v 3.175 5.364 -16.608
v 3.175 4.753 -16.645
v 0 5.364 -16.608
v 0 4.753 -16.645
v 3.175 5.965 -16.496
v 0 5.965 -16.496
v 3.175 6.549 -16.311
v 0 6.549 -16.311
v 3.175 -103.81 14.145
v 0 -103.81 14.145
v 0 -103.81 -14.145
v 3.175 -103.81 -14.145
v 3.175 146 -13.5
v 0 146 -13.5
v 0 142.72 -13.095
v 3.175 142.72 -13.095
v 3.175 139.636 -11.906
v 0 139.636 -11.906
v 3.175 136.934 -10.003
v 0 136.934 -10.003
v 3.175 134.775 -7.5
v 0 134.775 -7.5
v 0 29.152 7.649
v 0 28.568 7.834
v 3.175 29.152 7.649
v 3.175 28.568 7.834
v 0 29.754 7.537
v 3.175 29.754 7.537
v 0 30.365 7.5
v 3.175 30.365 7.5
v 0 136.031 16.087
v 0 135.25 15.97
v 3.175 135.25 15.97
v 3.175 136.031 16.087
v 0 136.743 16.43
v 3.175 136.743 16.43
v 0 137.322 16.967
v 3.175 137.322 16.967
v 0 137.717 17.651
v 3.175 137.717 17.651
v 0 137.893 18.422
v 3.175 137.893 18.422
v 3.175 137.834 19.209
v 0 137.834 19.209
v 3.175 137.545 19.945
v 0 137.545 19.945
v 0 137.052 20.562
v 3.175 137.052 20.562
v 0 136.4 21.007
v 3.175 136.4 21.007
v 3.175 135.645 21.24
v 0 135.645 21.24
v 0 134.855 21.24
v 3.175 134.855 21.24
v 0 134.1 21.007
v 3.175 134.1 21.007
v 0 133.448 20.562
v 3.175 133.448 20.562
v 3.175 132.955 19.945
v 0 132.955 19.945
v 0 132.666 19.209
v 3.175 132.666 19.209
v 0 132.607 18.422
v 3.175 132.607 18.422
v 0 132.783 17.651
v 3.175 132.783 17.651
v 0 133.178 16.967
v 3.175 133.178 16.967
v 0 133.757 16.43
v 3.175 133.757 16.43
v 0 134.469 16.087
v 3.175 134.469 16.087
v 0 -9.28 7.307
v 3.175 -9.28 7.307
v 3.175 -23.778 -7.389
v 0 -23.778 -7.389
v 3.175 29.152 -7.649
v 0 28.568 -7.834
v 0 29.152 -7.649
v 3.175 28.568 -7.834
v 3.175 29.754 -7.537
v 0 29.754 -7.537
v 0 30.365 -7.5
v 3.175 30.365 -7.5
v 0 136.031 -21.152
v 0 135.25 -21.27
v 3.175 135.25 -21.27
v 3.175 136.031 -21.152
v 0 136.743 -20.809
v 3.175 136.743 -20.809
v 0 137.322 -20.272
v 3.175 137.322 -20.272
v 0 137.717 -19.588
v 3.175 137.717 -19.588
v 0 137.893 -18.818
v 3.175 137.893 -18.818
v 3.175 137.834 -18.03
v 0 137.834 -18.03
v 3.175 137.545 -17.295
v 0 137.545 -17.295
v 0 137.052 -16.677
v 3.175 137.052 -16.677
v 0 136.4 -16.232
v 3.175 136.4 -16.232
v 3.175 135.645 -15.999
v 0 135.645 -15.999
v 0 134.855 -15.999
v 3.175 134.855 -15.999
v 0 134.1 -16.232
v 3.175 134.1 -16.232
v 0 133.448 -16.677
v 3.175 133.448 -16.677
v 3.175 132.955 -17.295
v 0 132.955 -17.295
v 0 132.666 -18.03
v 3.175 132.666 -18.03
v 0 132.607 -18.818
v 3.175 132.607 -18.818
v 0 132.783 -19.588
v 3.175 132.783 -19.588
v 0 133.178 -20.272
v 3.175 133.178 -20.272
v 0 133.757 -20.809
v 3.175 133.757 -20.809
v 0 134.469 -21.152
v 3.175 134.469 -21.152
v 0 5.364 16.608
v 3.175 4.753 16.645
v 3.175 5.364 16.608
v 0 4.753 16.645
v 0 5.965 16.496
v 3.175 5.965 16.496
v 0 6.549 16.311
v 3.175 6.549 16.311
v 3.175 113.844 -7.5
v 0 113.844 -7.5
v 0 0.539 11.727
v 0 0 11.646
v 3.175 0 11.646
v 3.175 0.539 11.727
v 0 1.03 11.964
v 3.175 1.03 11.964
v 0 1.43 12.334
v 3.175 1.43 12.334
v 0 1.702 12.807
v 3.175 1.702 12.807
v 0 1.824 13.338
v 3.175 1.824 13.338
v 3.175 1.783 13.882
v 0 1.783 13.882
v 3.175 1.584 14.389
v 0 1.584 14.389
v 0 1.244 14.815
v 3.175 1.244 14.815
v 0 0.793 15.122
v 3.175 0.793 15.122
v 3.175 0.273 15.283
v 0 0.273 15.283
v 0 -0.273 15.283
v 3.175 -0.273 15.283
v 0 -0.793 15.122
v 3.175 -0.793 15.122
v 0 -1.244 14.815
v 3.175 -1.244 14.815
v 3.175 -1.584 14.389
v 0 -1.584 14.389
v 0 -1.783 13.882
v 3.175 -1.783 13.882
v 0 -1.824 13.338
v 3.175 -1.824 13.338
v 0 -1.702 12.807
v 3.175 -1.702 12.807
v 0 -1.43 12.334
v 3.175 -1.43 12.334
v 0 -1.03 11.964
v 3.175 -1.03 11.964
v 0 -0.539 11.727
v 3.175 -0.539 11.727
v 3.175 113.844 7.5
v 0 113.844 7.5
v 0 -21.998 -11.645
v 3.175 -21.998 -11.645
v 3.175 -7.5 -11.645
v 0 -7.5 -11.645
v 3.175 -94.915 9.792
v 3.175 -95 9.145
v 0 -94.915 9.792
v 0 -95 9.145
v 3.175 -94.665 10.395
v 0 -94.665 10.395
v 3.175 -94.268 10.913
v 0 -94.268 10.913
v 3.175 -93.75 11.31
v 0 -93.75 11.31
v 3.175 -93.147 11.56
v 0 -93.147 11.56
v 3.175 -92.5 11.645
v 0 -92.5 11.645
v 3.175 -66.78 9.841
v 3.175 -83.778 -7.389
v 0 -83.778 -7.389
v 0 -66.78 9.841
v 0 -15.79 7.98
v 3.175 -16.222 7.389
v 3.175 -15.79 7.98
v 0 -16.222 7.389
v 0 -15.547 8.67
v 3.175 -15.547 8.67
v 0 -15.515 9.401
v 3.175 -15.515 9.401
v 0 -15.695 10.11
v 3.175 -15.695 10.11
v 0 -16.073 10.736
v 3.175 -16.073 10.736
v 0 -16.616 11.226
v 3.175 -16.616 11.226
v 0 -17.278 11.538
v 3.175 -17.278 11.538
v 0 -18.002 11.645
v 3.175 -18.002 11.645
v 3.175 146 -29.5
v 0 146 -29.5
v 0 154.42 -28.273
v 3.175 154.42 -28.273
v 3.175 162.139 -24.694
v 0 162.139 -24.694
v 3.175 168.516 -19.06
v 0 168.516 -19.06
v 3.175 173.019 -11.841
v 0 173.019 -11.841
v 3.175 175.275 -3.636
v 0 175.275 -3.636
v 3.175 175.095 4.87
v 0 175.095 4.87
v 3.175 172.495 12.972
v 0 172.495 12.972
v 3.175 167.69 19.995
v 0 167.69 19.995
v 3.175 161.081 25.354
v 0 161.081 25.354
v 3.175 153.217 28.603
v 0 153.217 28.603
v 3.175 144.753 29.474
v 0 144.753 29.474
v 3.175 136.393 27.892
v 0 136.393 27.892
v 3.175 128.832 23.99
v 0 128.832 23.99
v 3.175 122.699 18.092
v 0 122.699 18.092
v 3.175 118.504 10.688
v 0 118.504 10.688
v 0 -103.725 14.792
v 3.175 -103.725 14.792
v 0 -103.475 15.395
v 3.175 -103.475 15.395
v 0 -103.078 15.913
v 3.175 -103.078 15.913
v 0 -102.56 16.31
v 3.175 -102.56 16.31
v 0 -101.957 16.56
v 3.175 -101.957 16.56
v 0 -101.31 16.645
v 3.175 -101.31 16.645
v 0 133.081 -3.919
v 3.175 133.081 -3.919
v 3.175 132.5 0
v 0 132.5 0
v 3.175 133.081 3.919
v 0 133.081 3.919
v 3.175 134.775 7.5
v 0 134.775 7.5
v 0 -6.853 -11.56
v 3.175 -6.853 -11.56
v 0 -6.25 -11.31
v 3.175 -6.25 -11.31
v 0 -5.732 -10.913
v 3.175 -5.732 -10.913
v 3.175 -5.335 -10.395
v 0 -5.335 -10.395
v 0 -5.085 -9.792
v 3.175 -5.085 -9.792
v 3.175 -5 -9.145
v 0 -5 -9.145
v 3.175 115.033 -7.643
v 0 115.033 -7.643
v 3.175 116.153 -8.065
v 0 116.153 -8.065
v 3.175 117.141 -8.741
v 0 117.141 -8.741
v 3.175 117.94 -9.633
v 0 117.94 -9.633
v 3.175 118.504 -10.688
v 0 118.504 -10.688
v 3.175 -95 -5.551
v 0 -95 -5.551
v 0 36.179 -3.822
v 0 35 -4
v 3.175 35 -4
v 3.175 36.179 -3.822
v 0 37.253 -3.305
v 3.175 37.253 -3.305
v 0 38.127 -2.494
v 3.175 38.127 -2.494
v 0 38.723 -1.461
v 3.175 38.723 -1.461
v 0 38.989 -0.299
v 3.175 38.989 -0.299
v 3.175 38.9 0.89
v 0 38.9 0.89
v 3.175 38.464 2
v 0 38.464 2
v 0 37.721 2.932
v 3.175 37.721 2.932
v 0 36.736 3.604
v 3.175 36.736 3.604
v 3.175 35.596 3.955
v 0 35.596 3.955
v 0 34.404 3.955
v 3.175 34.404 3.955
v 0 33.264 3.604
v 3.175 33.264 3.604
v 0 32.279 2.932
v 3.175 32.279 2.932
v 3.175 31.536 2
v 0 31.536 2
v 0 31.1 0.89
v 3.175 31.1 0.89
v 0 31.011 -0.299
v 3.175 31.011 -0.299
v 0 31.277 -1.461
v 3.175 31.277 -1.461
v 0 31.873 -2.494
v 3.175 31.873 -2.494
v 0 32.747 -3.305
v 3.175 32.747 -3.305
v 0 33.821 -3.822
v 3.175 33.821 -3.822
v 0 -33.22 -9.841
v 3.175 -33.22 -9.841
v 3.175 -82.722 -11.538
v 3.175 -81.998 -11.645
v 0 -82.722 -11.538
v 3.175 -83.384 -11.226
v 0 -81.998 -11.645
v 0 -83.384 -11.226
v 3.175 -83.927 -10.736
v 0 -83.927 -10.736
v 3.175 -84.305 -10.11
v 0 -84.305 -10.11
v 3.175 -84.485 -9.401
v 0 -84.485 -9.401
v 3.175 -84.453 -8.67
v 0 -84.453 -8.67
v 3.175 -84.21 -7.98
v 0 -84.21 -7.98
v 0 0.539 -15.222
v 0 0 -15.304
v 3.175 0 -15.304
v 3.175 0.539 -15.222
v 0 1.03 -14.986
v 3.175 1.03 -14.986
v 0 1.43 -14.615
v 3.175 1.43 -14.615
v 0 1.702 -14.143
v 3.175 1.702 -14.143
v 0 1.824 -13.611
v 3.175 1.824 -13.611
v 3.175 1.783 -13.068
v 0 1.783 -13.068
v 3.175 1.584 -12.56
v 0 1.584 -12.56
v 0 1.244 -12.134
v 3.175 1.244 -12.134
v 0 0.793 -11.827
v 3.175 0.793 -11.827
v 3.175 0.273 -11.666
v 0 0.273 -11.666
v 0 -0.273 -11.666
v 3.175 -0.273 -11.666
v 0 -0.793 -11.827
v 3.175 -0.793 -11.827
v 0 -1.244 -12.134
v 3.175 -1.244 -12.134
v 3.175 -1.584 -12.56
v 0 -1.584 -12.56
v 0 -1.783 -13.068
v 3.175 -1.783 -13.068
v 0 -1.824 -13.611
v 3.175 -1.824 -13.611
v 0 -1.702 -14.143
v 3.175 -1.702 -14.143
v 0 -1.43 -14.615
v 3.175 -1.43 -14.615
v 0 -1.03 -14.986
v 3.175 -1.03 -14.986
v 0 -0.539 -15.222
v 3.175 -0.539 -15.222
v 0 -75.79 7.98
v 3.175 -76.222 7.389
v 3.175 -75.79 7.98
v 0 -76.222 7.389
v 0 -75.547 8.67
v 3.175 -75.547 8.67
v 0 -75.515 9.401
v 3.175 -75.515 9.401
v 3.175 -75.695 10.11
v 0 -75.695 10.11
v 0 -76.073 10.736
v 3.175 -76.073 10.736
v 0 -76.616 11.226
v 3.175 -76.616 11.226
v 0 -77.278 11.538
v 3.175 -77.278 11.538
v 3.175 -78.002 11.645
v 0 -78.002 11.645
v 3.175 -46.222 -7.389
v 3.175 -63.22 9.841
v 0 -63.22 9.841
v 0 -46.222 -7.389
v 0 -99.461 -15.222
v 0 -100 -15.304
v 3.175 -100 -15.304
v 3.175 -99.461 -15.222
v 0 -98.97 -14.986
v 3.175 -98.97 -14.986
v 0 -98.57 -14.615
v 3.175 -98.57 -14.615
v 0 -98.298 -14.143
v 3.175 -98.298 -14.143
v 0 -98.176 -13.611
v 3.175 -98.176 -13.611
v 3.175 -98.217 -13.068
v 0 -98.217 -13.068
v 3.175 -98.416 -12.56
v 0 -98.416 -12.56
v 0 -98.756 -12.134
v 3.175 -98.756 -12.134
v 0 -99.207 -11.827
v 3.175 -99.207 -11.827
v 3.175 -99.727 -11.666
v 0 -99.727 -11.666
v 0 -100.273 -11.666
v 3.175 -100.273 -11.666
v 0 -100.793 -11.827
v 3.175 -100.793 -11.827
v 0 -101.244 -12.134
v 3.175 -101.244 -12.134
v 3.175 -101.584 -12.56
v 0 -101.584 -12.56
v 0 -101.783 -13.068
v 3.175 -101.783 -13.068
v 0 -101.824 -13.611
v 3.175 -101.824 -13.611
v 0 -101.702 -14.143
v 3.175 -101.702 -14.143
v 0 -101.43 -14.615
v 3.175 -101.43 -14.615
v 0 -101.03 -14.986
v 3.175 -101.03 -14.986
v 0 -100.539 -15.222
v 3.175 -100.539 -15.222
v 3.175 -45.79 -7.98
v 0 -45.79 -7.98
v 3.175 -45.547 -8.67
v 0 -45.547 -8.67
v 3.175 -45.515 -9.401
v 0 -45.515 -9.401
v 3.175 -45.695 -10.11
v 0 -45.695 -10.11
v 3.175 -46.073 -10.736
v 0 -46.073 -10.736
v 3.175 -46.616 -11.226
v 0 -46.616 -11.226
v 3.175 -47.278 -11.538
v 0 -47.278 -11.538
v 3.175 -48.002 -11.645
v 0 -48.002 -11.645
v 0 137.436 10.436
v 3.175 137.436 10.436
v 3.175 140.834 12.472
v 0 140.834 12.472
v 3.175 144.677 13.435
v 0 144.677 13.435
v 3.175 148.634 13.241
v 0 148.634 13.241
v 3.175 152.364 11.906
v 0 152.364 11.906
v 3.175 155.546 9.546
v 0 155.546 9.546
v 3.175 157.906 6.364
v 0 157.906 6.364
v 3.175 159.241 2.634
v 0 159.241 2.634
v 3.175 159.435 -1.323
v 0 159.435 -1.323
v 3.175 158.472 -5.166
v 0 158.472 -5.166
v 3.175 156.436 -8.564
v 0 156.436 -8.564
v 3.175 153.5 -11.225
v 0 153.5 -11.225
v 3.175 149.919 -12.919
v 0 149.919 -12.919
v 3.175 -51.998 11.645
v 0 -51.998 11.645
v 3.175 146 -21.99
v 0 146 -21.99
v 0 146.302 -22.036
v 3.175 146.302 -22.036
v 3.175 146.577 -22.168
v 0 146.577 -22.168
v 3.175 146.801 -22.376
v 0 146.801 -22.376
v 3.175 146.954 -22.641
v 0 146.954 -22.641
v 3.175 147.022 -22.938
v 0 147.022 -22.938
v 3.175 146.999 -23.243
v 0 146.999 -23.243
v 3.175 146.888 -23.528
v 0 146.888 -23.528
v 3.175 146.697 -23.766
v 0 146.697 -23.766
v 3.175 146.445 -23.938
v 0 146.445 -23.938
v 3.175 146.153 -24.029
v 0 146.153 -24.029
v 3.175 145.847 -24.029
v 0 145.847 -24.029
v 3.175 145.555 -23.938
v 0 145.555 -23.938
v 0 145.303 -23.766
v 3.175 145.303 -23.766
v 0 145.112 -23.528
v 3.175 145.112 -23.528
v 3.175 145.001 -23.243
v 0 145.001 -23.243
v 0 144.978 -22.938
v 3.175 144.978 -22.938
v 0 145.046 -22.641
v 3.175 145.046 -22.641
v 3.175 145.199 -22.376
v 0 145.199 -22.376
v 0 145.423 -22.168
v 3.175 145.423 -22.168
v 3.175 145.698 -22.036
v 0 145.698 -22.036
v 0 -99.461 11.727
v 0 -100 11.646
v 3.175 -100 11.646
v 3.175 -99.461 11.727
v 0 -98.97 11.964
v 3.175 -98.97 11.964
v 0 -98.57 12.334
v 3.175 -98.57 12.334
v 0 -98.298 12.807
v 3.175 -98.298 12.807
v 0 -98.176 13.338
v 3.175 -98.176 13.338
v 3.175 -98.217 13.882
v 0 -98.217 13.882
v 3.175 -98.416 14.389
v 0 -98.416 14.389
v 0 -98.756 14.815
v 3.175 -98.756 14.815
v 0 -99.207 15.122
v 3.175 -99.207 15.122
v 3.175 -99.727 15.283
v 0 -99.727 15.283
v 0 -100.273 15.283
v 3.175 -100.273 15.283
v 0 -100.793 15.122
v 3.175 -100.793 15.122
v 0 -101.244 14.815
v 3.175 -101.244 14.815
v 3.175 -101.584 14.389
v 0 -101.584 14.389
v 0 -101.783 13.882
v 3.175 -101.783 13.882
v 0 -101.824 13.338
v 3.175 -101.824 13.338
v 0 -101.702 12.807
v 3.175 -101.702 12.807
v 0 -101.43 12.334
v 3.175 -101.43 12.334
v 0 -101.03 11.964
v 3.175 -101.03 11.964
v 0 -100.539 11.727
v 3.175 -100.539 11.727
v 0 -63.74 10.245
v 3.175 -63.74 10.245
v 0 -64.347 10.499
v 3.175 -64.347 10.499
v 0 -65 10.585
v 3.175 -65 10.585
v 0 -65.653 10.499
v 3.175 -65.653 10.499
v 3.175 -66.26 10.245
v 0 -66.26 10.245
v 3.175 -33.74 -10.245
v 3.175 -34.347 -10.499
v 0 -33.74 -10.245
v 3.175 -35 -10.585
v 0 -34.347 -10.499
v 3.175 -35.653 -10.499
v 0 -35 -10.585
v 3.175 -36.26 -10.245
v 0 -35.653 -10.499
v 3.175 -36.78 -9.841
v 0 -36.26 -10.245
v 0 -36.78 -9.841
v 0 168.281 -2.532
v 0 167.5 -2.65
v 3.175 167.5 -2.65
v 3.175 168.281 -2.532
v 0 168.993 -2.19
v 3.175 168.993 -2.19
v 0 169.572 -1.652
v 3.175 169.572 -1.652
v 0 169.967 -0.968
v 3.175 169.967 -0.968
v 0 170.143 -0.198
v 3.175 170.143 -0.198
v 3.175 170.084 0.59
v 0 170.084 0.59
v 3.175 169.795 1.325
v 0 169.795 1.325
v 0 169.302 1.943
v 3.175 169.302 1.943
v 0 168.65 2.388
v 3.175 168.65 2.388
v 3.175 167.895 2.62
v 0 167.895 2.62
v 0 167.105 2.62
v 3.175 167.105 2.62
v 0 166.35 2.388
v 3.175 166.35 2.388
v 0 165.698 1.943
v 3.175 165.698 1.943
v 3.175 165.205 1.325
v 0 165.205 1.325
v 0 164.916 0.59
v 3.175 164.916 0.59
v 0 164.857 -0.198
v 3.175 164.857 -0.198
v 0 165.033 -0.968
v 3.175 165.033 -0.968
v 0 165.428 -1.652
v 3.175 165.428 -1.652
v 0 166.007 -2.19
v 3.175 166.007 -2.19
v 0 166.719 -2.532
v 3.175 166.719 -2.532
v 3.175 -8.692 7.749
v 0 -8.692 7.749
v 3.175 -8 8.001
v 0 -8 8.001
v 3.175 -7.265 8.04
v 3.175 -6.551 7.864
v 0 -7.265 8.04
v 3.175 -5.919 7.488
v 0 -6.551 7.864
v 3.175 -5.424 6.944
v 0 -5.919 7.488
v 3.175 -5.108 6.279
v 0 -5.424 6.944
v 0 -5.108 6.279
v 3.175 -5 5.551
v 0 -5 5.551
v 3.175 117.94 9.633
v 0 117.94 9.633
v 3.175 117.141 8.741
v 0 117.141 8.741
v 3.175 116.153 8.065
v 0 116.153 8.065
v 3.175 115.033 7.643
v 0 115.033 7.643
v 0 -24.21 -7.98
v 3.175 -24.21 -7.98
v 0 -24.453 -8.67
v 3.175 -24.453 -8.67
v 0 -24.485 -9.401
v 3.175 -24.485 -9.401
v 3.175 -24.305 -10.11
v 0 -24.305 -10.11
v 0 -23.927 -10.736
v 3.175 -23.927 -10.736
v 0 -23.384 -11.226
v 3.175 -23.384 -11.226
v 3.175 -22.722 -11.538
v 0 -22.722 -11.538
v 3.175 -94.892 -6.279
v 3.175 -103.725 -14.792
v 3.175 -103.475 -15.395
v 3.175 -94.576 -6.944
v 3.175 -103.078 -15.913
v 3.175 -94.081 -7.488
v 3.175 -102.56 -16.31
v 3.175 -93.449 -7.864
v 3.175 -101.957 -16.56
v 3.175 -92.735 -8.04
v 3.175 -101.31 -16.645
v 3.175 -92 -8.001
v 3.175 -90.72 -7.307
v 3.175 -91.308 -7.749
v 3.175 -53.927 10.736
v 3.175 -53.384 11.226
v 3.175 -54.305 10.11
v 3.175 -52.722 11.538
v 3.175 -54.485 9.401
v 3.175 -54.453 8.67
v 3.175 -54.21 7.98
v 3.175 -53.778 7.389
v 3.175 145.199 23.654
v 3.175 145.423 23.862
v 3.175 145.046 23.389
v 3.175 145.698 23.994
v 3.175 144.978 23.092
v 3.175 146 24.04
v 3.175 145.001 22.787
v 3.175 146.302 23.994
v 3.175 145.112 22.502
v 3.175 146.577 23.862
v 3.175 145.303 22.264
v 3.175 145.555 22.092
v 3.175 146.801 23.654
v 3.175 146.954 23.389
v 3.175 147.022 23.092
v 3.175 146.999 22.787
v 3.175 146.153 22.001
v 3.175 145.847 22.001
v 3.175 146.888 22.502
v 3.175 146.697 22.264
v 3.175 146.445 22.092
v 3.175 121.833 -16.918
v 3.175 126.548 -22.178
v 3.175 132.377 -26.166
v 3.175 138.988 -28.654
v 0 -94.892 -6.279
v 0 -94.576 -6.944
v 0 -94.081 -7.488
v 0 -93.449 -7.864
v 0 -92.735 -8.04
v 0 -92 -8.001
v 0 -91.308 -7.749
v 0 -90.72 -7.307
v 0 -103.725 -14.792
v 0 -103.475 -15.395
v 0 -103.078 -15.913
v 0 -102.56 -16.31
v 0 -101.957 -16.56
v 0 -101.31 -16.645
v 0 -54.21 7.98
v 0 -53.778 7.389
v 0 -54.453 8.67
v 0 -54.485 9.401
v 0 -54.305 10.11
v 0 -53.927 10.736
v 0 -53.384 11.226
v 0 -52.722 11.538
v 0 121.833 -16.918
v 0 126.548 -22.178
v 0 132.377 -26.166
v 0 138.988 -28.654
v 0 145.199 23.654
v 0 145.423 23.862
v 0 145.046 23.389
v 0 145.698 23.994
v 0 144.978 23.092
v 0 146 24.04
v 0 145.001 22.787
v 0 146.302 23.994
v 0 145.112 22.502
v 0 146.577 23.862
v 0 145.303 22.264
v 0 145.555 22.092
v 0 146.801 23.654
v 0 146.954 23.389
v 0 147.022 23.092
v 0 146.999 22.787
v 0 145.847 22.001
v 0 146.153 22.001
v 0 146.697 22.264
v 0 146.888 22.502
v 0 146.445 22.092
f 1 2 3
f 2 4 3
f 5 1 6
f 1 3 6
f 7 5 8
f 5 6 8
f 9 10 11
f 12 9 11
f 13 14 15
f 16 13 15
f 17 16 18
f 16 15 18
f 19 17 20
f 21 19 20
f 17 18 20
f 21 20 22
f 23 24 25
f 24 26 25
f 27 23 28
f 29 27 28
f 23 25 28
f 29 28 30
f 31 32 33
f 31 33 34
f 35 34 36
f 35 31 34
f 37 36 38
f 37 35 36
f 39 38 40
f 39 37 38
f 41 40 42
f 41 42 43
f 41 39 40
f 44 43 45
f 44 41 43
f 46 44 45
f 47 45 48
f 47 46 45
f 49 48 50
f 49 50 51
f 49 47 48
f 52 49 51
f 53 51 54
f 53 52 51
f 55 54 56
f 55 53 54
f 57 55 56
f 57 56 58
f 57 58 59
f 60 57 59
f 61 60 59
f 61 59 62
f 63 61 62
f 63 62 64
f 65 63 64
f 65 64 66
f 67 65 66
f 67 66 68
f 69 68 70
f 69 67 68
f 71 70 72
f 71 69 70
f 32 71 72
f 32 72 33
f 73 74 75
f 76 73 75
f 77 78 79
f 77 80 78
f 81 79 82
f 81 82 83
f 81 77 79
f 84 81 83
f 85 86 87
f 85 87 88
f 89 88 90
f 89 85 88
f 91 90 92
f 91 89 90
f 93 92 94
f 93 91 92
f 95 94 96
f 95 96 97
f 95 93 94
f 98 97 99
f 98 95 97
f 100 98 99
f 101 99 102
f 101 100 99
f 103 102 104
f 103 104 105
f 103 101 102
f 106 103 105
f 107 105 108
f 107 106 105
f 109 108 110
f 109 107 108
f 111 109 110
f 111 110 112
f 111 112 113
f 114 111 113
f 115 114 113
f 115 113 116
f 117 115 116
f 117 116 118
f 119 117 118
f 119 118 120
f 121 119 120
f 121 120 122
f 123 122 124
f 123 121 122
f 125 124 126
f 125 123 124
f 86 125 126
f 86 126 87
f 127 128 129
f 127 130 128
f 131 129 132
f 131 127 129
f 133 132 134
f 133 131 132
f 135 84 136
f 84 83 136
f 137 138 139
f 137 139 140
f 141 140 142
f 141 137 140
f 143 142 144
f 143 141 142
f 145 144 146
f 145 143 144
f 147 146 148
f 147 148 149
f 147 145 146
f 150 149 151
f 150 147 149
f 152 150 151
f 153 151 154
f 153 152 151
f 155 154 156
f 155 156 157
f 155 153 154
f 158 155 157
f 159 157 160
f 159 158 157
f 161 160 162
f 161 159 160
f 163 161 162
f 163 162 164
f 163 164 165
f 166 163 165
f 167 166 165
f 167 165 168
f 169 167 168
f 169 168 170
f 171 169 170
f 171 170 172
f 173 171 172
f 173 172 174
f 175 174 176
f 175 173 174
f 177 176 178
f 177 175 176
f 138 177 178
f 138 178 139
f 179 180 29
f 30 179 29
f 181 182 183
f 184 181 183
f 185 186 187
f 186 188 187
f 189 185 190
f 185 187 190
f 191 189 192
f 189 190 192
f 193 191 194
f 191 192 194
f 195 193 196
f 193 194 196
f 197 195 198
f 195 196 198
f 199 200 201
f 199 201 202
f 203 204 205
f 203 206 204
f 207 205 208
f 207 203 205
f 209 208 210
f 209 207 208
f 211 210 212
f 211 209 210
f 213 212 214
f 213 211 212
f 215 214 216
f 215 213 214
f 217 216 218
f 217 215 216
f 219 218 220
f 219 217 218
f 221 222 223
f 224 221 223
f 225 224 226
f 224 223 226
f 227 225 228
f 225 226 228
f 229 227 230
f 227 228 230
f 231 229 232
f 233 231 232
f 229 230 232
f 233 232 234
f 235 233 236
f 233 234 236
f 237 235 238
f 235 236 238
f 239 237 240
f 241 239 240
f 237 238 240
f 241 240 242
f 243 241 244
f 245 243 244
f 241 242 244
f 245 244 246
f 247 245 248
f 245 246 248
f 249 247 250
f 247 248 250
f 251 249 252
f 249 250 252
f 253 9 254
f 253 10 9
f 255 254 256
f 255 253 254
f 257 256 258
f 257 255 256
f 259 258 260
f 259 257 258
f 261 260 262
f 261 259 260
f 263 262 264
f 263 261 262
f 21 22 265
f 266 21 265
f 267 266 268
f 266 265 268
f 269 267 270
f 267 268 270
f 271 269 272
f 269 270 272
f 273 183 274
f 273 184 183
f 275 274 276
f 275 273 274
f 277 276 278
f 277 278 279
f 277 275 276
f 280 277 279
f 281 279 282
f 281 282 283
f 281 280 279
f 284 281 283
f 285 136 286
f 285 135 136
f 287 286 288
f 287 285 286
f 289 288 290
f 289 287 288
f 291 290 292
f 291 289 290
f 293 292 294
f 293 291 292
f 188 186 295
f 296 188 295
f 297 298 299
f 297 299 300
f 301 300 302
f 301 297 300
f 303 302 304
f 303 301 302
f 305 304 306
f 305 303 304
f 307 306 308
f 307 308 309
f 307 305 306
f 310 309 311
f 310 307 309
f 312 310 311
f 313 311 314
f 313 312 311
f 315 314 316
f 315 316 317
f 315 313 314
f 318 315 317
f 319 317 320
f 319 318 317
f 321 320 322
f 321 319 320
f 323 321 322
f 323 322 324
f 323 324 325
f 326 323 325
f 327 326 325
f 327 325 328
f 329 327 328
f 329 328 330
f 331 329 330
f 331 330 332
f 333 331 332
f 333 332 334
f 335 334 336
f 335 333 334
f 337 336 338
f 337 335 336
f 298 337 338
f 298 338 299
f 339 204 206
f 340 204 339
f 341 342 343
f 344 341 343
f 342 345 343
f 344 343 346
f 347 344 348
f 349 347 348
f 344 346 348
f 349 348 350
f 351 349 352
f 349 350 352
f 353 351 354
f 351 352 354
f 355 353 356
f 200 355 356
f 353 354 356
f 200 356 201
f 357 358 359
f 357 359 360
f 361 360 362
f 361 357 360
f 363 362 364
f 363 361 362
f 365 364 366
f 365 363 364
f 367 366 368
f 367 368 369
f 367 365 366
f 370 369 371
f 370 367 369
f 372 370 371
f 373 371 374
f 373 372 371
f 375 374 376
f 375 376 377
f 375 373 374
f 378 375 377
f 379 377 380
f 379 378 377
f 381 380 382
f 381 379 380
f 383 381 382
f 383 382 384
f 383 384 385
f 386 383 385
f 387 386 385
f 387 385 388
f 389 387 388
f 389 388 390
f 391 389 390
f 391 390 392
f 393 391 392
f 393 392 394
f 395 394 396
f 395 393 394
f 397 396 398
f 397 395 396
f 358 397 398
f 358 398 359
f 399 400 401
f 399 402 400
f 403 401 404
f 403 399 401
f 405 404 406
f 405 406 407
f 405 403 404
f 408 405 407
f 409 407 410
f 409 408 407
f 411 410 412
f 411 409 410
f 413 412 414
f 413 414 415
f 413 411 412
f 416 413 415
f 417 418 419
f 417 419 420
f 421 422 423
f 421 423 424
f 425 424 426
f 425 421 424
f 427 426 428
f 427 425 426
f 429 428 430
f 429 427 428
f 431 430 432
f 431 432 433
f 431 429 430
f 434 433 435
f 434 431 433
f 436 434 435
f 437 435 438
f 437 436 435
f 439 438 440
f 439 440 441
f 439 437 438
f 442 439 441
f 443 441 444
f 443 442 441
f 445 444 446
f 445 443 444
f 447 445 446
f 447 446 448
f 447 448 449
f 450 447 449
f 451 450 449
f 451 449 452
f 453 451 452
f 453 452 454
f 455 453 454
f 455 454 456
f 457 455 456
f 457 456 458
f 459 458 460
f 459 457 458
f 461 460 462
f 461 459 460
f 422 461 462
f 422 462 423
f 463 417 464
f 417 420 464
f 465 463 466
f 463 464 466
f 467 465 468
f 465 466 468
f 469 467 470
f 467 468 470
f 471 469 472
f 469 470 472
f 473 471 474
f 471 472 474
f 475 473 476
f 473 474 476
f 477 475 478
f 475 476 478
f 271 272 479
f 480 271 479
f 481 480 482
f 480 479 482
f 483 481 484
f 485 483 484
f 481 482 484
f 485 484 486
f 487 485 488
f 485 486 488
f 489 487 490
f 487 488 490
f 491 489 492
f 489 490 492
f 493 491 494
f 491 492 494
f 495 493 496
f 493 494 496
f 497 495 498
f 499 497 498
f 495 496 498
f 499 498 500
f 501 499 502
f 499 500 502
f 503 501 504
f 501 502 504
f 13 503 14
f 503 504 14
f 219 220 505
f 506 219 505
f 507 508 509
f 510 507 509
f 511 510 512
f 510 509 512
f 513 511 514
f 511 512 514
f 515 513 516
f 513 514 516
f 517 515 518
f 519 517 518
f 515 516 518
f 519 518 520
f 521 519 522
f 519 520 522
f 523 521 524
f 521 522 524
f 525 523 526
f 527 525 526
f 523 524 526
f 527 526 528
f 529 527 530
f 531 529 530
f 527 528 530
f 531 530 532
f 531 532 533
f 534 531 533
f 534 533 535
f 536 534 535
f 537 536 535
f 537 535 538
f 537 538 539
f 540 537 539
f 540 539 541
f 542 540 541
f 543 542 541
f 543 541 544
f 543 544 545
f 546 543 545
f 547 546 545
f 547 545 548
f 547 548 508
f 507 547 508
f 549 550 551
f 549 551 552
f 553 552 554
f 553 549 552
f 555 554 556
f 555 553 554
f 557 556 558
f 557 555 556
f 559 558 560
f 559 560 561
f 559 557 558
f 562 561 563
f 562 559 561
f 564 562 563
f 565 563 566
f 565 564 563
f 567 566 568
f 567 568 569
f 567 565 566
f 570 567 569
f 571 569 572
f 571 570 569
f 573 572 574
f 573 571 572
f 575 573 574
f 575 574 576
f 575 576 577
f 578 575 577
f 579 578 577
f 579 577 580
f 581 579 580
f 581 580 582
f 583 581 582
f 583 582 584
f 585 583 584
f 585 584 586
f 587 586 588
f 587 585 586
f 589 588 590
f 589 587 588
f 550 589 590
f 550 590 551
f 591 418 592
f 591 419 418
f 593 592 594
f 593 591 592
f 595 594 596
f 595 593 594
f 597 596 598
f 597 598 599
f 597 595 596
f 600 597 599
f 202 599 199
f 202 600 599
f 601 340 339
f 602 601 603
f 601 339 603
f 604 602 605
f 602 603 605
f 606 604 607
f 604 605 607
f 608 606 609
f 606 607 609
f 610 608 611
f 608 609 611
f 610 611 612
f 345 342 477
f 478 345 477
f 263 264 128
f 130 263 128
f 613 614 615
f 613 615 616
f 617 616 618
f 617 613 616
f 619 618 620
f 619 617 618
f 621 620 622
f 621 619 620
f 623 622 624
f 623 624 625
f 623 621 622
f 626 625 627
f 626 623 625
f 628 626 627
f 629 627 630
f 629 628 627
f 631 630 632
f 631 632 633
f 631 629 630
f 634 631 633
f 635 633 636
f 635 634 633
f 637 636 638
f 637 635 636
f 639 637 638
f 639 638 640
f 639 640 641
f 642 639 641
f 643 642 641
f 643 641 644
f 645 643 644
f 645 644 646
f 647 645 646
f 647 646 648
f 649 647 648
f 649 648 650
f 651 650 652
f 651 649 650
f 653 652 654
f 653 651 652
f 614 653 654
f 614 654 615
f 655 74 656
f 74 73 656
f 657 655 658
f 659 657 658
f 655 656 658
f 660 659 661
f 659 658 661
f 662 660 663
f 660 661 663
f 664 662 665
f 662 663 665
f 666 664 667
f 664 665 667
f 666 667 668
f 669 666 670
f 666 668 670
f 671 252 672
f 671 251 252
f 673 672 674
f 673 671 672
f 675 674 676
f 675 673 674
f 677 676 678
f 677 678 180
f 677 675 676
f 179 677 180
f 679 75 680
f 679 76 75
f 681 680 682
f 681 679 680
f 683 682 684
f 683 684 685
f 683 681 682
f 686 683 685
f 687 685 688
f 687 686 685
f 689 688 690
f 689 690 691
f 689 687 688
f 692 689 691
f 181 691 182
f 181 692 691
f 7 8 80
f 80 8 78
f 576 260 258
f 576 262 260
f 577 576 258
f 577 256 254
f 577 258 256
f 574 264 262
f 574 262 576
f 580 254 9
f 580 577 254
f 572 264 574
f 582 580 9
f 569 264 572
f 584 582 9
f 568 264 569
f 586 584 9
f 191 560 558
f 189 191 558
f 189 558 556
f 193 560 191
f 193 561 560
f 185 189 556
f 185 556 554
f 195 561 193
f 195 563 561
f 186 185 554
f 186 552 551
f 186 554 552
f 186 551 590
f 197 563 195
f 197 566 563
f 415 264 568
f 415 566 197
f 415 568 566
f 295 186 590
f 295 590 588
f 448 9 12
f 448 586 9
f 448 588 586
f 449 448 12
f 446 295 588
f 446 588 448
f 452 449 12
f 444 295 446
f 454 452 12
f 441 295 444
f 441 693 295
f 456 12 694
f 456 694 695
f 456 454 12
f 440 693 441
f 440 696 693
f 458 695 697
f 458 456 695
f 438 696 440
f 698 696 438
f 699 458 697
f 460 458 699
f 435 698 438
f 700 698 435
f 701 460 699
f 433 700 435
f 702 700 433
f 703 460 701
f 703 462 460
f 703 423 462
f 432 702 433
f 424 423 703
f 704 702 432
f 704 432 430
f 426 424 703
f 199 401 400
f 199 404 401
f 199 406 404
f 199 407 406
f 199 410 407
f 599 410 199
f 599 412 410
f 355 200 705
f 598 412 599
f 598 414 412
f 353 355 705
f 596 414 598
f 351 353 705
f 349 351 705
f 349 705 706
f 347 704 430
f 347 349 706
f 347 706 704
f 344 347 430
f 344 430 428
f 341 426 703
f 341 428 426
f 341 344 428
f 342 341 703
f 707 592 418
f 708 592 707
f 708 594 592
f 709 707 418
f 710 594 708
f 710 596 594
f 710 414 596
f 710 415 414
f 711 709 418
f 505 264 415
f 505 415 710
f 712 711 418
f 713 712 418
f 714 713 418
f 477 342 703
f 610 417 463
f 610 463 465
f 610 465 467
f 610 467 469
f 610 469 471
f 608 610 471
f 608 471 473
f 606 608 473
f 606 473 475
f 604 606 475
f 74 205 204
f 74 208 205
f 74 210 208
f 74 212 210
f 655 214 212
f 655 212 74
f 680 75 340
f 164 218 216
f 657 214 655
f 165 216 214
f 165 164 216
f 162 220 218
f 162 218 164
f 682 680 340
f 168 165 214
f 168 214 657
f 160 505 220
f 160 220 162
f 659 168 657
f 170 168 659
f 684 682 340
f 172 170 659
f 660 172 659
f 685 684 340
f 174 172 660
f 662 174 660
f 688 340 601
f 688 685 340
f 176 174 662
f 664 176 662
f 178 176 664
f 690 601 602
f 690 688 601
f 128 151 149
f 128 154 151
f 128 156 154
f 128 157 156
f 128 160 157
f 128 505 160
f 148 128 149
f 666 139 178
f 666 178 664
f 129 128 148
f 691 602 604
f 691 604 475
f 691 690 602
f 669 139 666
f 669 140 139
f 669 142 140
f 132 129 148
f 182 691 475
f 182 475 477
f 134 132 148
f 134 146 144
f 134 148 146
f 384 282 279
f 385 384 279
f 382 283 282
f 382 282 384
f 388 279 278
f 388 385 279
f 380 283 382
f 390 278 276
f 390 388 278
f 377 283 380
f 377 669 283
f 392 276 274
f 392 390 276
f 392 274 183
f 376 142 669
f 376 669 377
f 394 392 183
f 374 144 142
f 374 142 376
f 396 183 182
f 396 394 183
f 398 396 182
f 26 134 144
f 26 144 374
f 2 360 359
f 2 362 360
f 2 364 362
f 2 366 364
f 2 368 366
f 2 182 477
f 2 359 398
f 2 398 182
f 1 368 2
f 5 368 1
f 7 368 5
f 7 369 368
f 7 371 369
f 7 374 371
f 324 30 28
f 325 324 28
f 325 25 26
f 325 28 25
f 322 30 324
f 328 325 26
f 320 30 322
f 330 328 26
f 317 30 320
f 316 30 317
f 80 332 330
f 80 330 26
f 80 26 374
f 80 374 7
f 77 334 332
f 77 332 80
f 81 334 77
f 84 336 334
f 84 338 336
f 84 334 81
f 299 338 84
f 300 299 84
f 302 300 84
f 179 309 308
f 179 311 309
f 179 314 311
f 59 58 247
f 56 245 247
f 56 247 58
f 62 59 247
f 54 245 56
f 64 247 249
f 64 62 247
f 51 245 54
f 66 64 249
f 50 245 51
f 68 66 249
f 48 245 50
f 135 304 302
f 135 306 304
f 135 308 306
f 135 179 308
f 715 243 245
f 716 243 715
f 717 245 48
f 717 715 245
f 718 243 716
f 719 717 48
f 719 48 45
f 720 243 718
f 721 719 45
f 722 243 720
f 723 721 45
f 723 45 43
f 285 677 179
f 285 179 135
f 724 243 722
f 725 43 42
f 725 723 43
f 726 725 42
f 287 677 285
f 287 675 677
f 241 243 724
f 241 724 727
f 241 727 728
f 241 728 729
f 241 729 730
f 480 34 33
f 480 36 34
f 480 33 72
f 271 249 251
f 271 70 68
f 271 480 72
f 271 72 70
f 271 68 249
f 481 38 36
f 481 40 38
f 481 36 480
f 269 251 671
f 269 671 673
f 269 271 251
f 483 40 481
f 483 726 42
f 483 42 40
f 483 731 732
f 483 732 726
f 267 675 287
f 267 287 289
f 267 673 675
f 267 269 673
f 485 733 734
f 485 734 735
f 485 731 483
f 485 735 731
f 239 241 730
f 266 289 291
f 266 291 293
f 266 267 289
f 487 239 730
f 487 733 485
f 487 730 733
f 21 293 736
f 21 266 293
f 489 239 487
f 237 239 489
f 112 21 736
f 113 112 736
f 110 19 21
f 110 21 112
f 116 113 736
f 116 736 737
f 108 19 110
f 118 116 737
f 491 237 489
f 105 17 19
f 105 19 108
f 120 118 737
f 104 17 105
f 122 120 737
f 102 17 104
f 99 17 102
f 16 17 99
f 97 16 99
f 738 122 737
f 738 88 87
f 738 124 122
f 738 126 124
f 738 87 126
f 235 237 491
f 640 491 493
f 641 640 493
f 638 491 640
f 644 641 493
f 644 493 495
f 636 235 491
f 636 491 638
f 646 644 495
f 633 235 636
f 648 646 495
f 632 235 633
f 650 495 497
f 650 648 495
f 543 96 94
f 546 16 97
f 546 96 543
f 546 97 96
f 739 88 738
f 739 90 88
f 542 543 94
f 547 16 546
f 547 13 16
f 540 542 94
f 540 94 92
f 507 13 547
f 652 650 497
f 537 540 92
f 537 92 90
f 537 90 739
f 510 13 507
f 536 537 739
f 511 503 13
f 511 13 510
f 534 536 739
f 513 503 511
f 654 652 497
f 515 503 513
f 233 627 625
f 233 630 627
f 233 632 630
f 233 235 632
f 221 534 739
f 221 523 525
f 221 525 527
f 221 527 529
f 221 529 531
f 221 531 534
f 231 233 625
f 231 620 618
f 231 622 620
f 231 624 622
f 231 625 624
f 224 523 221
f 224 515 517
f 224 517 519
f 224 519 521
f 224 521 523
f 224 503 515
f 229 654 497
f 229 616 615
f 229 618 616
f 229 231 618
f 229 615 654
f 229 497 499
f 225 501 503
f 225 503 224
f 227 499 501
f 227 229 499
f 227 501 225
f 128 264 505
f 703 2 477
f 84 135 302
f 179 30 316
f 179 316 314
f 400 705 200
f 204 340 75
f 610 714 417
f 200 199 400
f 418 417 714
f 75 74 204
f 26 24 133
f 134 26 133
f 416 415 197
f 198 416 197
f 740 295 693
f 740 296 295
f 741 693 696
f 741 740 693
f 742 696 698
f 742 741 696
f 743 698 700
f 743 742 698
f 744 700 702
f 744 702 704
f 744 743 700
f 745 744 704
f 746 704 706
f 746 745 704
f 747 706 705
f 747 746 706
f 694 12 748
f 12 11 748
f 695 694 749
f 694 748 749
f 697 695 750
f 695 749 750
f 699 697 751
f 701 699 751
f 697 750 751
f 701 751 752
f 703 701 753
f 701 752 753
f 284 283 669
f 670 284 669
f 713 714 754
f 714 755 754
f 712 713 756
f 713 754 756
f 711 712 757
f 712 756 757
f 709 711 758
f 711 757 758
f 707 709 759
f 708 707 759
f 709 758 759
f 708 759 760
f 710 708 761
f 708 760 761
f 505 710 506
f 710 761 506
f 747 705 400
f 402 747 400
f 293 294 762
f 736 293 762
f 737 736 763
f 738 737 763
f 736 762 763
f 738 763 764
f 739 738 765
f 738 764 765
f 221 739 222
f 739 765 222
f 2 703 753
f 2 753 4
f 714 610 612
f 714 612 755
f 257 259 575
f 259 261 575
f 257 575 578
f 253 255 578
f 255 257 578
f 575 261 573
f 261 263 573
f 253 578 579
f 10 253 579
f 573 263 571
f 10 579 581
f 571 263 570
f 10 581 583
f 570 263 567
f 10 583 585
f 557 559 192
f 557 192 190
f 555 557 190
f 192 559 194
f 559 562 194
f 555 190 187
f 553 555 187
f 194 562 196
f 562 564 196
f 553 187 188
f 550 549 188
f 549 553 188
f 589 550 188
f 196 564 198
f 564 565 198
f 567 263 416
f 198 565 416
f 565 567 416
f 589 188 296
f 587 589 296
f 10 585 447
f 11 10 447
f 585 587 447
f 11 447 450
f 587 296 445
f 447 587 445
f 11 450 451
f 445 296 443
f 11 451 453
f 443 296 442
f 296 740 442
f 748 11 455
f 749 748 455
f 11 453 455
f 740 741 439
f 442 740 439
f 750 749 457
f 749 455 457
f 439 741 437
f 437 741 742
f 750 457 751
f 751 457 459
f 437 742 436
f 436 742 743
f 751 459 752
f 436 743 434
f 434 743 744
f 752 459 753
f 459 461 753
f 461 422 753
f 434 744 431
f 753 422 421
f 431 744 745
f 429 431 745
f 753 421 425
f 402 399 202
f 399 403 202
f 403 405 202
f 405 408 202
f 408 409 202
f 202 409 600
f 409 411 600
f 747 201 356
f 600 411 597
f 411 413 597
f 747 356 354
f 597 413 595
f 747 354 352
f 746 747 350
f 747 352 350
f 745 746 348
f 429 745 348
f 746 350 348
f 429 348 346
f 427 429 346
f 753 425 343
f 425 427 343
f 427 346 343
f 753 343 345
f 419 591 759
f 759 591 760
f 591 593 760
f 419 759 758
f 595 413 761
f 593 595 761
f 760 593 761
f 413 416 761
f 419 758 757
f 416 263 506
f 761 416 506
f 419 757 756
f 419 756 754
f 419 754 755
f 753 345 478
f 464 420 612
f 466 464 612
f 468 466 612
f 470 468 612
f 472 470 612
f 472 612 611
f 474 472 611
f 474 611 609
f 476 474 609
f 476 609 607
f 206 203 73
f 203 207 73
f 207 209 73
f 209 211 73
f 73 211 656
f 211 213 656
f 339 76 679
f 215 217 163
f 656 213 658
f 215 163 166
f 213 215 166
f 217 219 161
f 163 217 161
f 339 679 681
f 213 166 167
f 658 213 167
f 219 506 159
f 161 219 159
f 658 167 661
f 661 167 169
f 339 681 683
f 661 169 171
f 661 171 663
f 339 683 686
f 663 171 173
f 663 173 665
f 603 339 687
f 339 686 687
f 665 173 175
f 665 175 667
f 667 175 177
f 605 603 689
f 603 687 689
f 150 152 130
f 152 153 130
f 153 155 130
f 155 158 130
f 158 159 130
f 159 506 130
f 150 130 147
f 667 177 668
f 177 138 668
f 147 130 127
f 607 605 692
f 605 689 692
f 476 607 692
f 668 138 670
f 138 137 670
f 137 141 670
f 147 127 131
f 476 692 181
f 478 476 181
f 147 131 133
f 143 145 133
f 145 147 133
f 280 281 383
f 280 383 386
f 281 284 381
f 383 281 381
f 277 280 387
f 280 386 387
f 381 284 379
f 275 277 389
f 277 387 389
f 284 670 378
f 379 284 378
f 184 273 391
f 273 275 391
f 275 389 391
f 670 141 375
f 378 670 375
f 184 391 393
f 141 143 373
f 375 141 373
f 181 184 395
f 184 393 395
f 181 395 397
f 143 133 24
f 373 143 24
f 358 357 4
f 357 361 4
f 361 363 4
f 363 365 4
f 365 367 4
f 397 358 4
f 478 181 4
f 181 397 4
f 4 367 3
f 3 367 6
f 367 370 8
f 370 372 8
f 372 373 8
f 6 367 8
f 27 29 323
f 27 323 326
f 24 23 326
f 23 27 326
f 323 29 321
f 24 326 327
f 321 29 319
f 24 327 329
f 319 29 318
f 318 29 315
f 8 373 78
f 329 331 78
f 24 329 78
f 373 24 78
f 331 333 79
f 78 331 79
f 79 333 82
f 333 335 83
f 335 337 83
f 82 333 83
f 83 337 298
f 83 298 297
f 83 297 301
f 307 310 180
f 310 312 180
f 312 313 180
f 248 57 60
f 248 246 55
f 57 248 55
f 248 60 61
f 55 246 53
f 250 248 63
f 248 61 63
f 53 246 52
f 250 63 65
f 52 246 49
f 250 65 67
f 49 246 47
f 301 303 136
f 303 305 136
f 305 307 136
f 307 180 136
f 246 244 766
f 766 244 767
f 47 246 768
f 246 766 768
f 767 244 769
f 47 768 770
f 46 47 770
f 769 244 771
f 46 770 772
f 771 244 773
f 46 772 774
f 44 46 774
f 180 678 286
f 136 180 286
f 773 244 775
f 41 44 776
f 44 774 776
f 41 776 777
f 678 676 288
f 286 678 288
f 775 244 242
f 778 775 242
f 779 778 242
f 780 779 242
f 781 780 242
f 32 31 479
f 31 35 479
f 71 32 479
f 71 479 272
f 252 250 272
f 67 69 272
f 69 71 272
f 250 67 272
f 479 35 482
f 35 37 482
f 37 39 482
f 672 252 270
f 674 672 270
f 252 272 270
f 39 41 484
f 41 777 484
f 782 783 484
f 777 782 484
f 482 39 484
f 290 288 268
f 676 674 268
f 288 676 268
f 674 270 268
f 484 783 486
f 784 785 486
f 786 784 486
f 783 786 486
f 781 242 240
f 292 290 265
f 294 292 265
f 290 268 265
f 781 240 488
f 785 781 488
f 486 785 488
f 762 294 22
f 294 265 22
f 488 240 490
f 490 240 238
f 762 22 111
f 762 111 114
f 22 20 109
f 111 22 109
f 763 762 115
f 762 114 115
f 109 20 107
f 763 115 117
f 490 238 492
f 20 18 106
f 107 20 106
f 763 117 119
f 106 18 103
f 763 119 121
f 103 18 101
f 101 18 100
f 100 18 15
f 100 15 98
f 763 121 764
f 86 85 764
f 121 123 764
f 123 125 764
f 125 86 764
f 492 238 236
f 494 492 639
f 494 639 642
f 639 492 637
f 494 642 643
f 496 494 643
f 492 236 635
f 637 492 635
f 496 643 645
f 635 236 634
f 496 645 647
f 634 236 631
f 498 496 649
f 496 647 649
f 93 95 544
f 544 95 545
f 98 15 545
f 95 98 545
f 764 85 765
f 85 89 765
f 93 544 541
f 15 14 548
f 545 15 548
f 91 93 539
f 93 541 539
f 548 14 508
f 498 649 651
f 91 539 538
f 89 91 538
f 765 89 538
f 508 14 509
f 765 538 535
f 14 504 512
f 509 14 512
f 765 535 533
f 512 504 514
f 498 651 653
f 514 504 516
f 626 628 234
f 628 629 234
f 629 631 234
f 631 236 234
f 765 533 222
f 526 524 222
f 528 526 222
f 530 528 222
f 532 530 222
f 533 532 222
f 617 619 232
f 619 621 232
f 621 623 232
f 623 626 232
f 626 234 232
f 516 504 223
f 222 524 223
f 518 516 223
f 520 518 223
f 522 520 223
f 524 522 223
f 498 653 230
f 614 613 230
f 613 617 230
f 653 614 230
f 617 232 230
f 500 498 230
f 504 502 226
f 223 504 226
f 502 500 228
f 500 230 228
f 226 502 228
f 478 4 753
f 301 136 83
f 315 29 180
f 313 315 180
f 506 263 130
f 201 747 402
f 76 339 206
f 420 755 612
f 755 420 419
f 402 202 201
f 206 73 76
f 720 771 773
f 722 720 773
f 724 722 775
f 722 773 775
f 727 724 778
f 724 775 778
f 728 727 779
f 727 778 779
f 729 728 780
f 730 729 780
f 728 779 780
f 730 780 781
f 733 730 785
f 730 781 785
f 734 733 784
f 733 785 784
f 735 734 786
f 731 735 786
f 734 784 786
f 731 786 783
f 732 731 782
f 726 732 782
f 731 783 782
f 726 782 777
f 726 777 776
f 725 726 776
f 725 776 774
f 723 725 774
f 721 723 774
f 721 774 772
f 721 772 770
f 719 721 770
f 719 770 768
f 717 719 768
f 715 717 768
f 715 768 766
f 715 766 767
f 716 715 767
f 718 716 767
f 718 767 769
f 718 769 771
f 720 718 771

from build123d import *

# Parameters (mm, degrees)
SKETCH1_R                = 2.65
SKETCH1_R_2              = 4
SKETCH1_R_3              = 1.8288
SKETCH1_W                = 41.514809608
SKETCH1_H                = 98.81
BOSS_EXTRUDE1_DEPTH      = 3.175
CUT_EXTRUDE1_REACH       = 179.99
SKETCH2_W                = 4.112404804
SKETCH2_H                = 133.245584328
FILLET3_R                = 2.5
FILLET4_R                = 5
M2_5X0_45_TAPPED_HOLE1_D = 2.05


with BuildPart() as part:
    # Sketch1 → Boss-Extrude1 (new body)
    # profile 1 of 8: a face of its own
    with BuildSketch(Plane(origin=(0, 0, 0), x_dir=(0, 0, -1), z_dir=(1, 0, 0))):
        with BuildLine():
            Line((7.5, 134.77502784), (7.5, 117.469314765))
            ThreePointArc((7.5, 117.469314765), (23.361292772, 127.986116465), (29.5, 146))
            ThreePointArc((29.5, 146), (-18.013883535, 169.361292772), (-7.5, 117.469314765))
            Line((-7.5, 117.469314765), (-7.5, 134.77502784))
            ThreePointArc((-7.5, 134.77502784), (-6.363961031, 157.9058809), (13.5, 146))
            ThreePointArc((13.5, 146), (11.9058809, 139.636038969), (7.5, 134.77502784))
        make_face()
        with Locations((-18.619546181, 135.25)):
            Circle(SKETCH1_R, mode=Mode.SUBTRACT)
        with Locations((0, 167.5)):
            Circle(SKETCH1_R, mode=Mode.SUBTRACT)
        with Locations((18.619546181, 135.25)):
            Circle(SKETCH1_R, mode=Mode.SUBTRACT)
    # profile 2 of 8: a face of its own
    with BuildSketch(Plane(origin=(0, 0, 0), x_dir=(0, 0, -1), z_dir=(1, 0, 0))):
        with BuildLine():
            ThreePointArc((-7.5, 117.469314765), (0, 116.5), (7.5, 117.469314765))
            Line((7.5, 117.469314765), (7.5, 134.77502784))
            ThreePointArc((7.5, 134.77502784), (0, 132.5), (-7.5, 134.77502784))
            Line((-7.5, 134.77502784), (-7.5, 117.469314765))
        make_face()
    # profile 3 of 8: a face of its own
    with BuildSketch(Plane(origin=(0, 0, 0), x_dir=(0, 0, -1), z_dir=(1, 0, 0))):
        with BuildLine():
            Line((0, 48.916537522), (6.674602804, 31.57952088))
            ThreePointArc((6.674602804, 31.57952088), (7.290731137, 33.240670729), (7.5, 35))
            Line((7.5, 35), (7.5, 117.469314765))
            ThreePointArc((7.5, 117.469314765), (0, 116.5), (-7.5, 117.469314765))
            Line((-7.5, 117.469314765), (-7.5, 35))
            ThreePointArc((-7.5, 35), (-7.290731137, 33.240670729), (-6.674602804, 31.57952088))
            Line((-6.674602804, 31.57952088), (0, 48.916537522))
        make_face()
    # profile 4 of 8: a face of its own
    with BuildSketch(Plane(origin=(0, 0, 0), x_dir=(0, 0, -1), z_dir=(1, 0, 0))):
        with BuildLine():
            ThreePointArc((-6.674602804, 31.57952088), (0, 27.5), (6.674602804, 31.57952088))
            Line((6.674602804, 31.57952088), (0, 48.916537522))
            Line((0, 48.916537522), (-6.674602804, 31.57952088))
        make_face()
        with Locations((0, 35)):
            Circle(SKETCH1_R_2, mode=Mode.SUBTRACT)
    # profile 5 of 8: a face of its own
    with BuildSketch(Plane(origin=(0, 0, 0), x_dir=(0, 0, -1), z_dir=(1, 0, 0))):
        with BuildLine():
            Line((-20.757404804, -5), (20.757404804, -5))
            Line((20.757404804, -5), (7.5, 29.435584328))
            Line((7.5, 29.435584328), (6.674602804, 31.57952088))
            ThreePointArc((6.674602804, 31.57952088), (0, 27.5), (-6.674602804, 31.57952088))
            Line((-6.674602804, 31.57952088), (-7.5, 29.435584328))
            Line((-7.5, 29.435584328), (-20.757404804, -5))
        make_face()
        with Locations((-13.4747, 0)):
            Circle(SKETCH1_R_3, mode=Mode.SUBTRACT)
        with Locations((13.4747, 0)):
            Circle(SKETCH1_R_3, mode=Mode.SUBTRACT)
    # profile 6 of 8: a face of its own
    with BuildSketch(Plane(origin=(0, 0, 0), x_dir=(0, 0, -1), z_dir=(1, 0, 0))):
        with BuildLine():
            Line((-7.5, 35), (-7.5, 29.435584328))
            Line((-7.5, 29.435584328), (-6.674602804, 31.57952088))
            ThreePointArc((-6.674602804, 31.57952088), (-7.290731137, 33.240670729), (-7.5, 35))
        make_face()
    # profile 7 of 8: a face of its own
    with BuildSketch(Plane(origin=(0, 0, 0), x_dir=(0, 0, -1), z_dir=(1, 0, 0))):
        with BuildLine():
            Line((6.674602804, 31.57952088), (7.5, 29.435584328))
            Line((7.5, 29.435584328), (7.5, 35))
            ThreePointArc((7.5, 35), (7.290731137, 33.240670729), (6.674602804, 31.57952088))
        make_face()
    # profile 8 of 8: a face of its own
    with BuildSketch(Plane(origin=(0, 0, 0), x_dir=(0, 0, -1), z_dir=(1, 0, 0))):
        with Locations((0, -54.405)):
            Rectangle(SKETCH1_W, SKETCH1_H)
        with Locations((13.4747, -100)):
            Circle(SKETCH1_R_3, mode=Mode.SUBTRACT)
        with Locations((-13.4747, -100)):
            Circle(SKETCH1_R_3, mode=Mode.SUBTRACT)
    extrude(amount=BOSS_EXTRUDE1_DEPTH)

    # Sketch2 → Cut-Extrude1 (cut, up to next)
    with BuildSketch(Plane(origin=(3.175, 0, 0), x_dir=(0, 0, -1), z_dir=(1, 0, 0)), mode=Mode.PRIVATE) as cut_extrude1_sk1:
        Polygon((11.645, -5), (-11.645, -5), (11.645, -27.976379872), align=None)
    cut_extrude1_tool1 = extrude(cut_extrude1_sk1.sketch, amount=-CUT_EXTRUDE1_REACH, mode=Mode.PRIVATE) & part.part
    # Sketch2 → Cut-Extrude1 (cut, up to next)
    with BuildSketch(Plane(origin=(3.175, 0, 0), x_dir=(0, 0, -1), z_dir=(1, 0, 0)), mode=Mode.PRIVATE) as cut_extrude1_sk2:
        Polygon((-11.645, -12.023620128), (11.645, -35), (-11.645, -57.976379872), (-11.645, -35), align=None)
    cut_extrude1_tool2 = extrude(cut_extrude1_sk2.sketch, amount=-CUT_EXTRUDE1_REACH, mode=Mode.PRIVATE) & part.part
    # Sketch2 → Cut-Extrude1 (cut, up to next)
    with BuildSketch(Plane(origin=(3.175, 0, 0), x_dir=(0, 0, -1), z_dir=(1, 0, 0)), mode=Mode.PRIVATE) as cut_extrude1_sk3:
        Polygon((-11.645, -72.023620128), (-11.645, -95), (11.645, -95), align=None)
    cut_extrude1_tool3 = extrude(cut_extrude1_sk3.sketch, amount=-CUT_EXTRUDE1_REACH, mode=Mode.PRIVATE) & part.part
    # Sketch2 → Cut-Extrude1 (cut, up to next)
    with BuildSketch(Plane(origin=(3.175, 0, 0), x_dir=(0, 0, -1), z_dir=(1, 0, 0)), mode=Mode.PRIVATE) as cut_extrude1_sk4:
        Polygon((11.645, -42.023620128), (11.645, -65), (11.645, -87.976379872), (-11.645, -65), align=None)
    cut_extrude1_tool4 = extrude(cut_extrude1_sk4.sketch, amount=-CUT_EXTRUDE1_REACH, mode=Mode.PRIVATE) & part.part
    # Sketch2 → Cut-Extrude1 (cut, up to next)
    with BuildSketch(Plane(origin=(3.175, 0, 0), x_dir=(0, 0, -1), z_dir=(1, 0, 0)), mode=Mode.PRIVATE) as cut_extrude1_sk5:
        with Locations((-18.701202402, -37.187207836)):
            Rectangle(SKETCH2_W, SKETCH2_H)
    cut_extrude1_tool5 = extrude(cut_extrude1_sk5.sketch, amount=-CUT_EXTRUDE1_REACH, mode=Mode.PRIVATE) & part.part
    # Sketch2 → Cut-Extrude1 (cut, up to next)
    with BuildSketch(Plane(origin=(3.175, 0, 0), x_dir=(0, 0, -1), z_dir=(1, 0, 0)), mode=Mode.PRIVATE) as cut_extrude1_sk6:
        with Locations((18.701202402, -37.187207836)):
            Rectangle(SKETCH2_W, SKETCH2_H)
    cut_extrude1_tool6 = extrude(cut_extrude1_sk6.sketch, amount=-CUT_EXTRUDE1_REACH, mode=Mode.PRIVATE) & part.part
    add(cut_extrude1_tool1.solids().sort_by_distance((3.175, -12.658793, -3.881667))[0], mode=Mode.SUBTRACT)
    add(cut_extrude1_tool2.solids().sort_by_distance((3.175, -35, 3.881667))[0], mode=Mode.SUBTRACT)
    add(cut_extrude1_tool3.solids().sort_by_distance((3.175, -87.341207, 3.881667))[0], mode=Mode.SUBTRACT)
    add(cut_extrude1_tool4.solids().sort_by_distance((3.175, -65, -3.881667))[0], mode=Mode.SUBTRACT)
    add(cut_extrude1_tool5.solids().sort_by_distance((3.175, -37.187208, 18.701202))[0], mode=Mode.SUBTRACT)
    add(cut_extrude1_tool6.solids().sort_by_distance((3.175, -37.187208, -18.701202))[0], mode=Mode.SUBTRACT)

    # Fillet3
    fillet3_edges = [part.edges().sort_by_distance(p)[0] for p in [
        (1.5875, -72.023620128, 11.645),
        (1.5875, -95, -11.645),
        (1.5875, -95, 11.645),
        (1.5875, -87.976379872, -11.645),
        (1.5875, -65, 11.645),
        (1.5875, -42.023620128, -11.645),
        (1.5875, -27.976379872, -11.645),
        (1.5875, -5, 11.645),
        (1.5875, -5, -11.645),
        (1.5875, -103.81, 16.645),
        (1.5875, -12.023620128, 11.645),
        (1.5875, -35, -11.645),
        (1.5875, -57.976379872, 11.645),
        (1.5875, -103.81, -16.645),
    ]]
    fillet(fillet3_edges, radius=FILLET3_R)

    # Fillet4
    fillet4_edges = [part.edges().sort_by_distance(p)[0] for p in [
        (1.5875, 117.469314765, -7.5),
        (1.5875, 29.435584328, -7.5),
        (1.5875, 29.435584328, 7.5),
        (1.5875, 117.469314765, 7.5),
        (1.5875, 5.681808734, 16.645),
        (1.5875, 5.681808734, -16.645),
    ]]
    fillet(fillet4_edges, radius=FILLET4_R)

    # M2.5x0.45 Tapped Hole1 (through all)
    with Locations(Plane(origin=(3.175, 0, 0), x_dir=(0, 0, -1), z_dir=(1, 0, 0))):
        with Locations((23.015, 146), (-23.015, 146)):
            Hole(M2_5X0_45_TAPPED_HOLE1_D / 2)


solid = part.part
